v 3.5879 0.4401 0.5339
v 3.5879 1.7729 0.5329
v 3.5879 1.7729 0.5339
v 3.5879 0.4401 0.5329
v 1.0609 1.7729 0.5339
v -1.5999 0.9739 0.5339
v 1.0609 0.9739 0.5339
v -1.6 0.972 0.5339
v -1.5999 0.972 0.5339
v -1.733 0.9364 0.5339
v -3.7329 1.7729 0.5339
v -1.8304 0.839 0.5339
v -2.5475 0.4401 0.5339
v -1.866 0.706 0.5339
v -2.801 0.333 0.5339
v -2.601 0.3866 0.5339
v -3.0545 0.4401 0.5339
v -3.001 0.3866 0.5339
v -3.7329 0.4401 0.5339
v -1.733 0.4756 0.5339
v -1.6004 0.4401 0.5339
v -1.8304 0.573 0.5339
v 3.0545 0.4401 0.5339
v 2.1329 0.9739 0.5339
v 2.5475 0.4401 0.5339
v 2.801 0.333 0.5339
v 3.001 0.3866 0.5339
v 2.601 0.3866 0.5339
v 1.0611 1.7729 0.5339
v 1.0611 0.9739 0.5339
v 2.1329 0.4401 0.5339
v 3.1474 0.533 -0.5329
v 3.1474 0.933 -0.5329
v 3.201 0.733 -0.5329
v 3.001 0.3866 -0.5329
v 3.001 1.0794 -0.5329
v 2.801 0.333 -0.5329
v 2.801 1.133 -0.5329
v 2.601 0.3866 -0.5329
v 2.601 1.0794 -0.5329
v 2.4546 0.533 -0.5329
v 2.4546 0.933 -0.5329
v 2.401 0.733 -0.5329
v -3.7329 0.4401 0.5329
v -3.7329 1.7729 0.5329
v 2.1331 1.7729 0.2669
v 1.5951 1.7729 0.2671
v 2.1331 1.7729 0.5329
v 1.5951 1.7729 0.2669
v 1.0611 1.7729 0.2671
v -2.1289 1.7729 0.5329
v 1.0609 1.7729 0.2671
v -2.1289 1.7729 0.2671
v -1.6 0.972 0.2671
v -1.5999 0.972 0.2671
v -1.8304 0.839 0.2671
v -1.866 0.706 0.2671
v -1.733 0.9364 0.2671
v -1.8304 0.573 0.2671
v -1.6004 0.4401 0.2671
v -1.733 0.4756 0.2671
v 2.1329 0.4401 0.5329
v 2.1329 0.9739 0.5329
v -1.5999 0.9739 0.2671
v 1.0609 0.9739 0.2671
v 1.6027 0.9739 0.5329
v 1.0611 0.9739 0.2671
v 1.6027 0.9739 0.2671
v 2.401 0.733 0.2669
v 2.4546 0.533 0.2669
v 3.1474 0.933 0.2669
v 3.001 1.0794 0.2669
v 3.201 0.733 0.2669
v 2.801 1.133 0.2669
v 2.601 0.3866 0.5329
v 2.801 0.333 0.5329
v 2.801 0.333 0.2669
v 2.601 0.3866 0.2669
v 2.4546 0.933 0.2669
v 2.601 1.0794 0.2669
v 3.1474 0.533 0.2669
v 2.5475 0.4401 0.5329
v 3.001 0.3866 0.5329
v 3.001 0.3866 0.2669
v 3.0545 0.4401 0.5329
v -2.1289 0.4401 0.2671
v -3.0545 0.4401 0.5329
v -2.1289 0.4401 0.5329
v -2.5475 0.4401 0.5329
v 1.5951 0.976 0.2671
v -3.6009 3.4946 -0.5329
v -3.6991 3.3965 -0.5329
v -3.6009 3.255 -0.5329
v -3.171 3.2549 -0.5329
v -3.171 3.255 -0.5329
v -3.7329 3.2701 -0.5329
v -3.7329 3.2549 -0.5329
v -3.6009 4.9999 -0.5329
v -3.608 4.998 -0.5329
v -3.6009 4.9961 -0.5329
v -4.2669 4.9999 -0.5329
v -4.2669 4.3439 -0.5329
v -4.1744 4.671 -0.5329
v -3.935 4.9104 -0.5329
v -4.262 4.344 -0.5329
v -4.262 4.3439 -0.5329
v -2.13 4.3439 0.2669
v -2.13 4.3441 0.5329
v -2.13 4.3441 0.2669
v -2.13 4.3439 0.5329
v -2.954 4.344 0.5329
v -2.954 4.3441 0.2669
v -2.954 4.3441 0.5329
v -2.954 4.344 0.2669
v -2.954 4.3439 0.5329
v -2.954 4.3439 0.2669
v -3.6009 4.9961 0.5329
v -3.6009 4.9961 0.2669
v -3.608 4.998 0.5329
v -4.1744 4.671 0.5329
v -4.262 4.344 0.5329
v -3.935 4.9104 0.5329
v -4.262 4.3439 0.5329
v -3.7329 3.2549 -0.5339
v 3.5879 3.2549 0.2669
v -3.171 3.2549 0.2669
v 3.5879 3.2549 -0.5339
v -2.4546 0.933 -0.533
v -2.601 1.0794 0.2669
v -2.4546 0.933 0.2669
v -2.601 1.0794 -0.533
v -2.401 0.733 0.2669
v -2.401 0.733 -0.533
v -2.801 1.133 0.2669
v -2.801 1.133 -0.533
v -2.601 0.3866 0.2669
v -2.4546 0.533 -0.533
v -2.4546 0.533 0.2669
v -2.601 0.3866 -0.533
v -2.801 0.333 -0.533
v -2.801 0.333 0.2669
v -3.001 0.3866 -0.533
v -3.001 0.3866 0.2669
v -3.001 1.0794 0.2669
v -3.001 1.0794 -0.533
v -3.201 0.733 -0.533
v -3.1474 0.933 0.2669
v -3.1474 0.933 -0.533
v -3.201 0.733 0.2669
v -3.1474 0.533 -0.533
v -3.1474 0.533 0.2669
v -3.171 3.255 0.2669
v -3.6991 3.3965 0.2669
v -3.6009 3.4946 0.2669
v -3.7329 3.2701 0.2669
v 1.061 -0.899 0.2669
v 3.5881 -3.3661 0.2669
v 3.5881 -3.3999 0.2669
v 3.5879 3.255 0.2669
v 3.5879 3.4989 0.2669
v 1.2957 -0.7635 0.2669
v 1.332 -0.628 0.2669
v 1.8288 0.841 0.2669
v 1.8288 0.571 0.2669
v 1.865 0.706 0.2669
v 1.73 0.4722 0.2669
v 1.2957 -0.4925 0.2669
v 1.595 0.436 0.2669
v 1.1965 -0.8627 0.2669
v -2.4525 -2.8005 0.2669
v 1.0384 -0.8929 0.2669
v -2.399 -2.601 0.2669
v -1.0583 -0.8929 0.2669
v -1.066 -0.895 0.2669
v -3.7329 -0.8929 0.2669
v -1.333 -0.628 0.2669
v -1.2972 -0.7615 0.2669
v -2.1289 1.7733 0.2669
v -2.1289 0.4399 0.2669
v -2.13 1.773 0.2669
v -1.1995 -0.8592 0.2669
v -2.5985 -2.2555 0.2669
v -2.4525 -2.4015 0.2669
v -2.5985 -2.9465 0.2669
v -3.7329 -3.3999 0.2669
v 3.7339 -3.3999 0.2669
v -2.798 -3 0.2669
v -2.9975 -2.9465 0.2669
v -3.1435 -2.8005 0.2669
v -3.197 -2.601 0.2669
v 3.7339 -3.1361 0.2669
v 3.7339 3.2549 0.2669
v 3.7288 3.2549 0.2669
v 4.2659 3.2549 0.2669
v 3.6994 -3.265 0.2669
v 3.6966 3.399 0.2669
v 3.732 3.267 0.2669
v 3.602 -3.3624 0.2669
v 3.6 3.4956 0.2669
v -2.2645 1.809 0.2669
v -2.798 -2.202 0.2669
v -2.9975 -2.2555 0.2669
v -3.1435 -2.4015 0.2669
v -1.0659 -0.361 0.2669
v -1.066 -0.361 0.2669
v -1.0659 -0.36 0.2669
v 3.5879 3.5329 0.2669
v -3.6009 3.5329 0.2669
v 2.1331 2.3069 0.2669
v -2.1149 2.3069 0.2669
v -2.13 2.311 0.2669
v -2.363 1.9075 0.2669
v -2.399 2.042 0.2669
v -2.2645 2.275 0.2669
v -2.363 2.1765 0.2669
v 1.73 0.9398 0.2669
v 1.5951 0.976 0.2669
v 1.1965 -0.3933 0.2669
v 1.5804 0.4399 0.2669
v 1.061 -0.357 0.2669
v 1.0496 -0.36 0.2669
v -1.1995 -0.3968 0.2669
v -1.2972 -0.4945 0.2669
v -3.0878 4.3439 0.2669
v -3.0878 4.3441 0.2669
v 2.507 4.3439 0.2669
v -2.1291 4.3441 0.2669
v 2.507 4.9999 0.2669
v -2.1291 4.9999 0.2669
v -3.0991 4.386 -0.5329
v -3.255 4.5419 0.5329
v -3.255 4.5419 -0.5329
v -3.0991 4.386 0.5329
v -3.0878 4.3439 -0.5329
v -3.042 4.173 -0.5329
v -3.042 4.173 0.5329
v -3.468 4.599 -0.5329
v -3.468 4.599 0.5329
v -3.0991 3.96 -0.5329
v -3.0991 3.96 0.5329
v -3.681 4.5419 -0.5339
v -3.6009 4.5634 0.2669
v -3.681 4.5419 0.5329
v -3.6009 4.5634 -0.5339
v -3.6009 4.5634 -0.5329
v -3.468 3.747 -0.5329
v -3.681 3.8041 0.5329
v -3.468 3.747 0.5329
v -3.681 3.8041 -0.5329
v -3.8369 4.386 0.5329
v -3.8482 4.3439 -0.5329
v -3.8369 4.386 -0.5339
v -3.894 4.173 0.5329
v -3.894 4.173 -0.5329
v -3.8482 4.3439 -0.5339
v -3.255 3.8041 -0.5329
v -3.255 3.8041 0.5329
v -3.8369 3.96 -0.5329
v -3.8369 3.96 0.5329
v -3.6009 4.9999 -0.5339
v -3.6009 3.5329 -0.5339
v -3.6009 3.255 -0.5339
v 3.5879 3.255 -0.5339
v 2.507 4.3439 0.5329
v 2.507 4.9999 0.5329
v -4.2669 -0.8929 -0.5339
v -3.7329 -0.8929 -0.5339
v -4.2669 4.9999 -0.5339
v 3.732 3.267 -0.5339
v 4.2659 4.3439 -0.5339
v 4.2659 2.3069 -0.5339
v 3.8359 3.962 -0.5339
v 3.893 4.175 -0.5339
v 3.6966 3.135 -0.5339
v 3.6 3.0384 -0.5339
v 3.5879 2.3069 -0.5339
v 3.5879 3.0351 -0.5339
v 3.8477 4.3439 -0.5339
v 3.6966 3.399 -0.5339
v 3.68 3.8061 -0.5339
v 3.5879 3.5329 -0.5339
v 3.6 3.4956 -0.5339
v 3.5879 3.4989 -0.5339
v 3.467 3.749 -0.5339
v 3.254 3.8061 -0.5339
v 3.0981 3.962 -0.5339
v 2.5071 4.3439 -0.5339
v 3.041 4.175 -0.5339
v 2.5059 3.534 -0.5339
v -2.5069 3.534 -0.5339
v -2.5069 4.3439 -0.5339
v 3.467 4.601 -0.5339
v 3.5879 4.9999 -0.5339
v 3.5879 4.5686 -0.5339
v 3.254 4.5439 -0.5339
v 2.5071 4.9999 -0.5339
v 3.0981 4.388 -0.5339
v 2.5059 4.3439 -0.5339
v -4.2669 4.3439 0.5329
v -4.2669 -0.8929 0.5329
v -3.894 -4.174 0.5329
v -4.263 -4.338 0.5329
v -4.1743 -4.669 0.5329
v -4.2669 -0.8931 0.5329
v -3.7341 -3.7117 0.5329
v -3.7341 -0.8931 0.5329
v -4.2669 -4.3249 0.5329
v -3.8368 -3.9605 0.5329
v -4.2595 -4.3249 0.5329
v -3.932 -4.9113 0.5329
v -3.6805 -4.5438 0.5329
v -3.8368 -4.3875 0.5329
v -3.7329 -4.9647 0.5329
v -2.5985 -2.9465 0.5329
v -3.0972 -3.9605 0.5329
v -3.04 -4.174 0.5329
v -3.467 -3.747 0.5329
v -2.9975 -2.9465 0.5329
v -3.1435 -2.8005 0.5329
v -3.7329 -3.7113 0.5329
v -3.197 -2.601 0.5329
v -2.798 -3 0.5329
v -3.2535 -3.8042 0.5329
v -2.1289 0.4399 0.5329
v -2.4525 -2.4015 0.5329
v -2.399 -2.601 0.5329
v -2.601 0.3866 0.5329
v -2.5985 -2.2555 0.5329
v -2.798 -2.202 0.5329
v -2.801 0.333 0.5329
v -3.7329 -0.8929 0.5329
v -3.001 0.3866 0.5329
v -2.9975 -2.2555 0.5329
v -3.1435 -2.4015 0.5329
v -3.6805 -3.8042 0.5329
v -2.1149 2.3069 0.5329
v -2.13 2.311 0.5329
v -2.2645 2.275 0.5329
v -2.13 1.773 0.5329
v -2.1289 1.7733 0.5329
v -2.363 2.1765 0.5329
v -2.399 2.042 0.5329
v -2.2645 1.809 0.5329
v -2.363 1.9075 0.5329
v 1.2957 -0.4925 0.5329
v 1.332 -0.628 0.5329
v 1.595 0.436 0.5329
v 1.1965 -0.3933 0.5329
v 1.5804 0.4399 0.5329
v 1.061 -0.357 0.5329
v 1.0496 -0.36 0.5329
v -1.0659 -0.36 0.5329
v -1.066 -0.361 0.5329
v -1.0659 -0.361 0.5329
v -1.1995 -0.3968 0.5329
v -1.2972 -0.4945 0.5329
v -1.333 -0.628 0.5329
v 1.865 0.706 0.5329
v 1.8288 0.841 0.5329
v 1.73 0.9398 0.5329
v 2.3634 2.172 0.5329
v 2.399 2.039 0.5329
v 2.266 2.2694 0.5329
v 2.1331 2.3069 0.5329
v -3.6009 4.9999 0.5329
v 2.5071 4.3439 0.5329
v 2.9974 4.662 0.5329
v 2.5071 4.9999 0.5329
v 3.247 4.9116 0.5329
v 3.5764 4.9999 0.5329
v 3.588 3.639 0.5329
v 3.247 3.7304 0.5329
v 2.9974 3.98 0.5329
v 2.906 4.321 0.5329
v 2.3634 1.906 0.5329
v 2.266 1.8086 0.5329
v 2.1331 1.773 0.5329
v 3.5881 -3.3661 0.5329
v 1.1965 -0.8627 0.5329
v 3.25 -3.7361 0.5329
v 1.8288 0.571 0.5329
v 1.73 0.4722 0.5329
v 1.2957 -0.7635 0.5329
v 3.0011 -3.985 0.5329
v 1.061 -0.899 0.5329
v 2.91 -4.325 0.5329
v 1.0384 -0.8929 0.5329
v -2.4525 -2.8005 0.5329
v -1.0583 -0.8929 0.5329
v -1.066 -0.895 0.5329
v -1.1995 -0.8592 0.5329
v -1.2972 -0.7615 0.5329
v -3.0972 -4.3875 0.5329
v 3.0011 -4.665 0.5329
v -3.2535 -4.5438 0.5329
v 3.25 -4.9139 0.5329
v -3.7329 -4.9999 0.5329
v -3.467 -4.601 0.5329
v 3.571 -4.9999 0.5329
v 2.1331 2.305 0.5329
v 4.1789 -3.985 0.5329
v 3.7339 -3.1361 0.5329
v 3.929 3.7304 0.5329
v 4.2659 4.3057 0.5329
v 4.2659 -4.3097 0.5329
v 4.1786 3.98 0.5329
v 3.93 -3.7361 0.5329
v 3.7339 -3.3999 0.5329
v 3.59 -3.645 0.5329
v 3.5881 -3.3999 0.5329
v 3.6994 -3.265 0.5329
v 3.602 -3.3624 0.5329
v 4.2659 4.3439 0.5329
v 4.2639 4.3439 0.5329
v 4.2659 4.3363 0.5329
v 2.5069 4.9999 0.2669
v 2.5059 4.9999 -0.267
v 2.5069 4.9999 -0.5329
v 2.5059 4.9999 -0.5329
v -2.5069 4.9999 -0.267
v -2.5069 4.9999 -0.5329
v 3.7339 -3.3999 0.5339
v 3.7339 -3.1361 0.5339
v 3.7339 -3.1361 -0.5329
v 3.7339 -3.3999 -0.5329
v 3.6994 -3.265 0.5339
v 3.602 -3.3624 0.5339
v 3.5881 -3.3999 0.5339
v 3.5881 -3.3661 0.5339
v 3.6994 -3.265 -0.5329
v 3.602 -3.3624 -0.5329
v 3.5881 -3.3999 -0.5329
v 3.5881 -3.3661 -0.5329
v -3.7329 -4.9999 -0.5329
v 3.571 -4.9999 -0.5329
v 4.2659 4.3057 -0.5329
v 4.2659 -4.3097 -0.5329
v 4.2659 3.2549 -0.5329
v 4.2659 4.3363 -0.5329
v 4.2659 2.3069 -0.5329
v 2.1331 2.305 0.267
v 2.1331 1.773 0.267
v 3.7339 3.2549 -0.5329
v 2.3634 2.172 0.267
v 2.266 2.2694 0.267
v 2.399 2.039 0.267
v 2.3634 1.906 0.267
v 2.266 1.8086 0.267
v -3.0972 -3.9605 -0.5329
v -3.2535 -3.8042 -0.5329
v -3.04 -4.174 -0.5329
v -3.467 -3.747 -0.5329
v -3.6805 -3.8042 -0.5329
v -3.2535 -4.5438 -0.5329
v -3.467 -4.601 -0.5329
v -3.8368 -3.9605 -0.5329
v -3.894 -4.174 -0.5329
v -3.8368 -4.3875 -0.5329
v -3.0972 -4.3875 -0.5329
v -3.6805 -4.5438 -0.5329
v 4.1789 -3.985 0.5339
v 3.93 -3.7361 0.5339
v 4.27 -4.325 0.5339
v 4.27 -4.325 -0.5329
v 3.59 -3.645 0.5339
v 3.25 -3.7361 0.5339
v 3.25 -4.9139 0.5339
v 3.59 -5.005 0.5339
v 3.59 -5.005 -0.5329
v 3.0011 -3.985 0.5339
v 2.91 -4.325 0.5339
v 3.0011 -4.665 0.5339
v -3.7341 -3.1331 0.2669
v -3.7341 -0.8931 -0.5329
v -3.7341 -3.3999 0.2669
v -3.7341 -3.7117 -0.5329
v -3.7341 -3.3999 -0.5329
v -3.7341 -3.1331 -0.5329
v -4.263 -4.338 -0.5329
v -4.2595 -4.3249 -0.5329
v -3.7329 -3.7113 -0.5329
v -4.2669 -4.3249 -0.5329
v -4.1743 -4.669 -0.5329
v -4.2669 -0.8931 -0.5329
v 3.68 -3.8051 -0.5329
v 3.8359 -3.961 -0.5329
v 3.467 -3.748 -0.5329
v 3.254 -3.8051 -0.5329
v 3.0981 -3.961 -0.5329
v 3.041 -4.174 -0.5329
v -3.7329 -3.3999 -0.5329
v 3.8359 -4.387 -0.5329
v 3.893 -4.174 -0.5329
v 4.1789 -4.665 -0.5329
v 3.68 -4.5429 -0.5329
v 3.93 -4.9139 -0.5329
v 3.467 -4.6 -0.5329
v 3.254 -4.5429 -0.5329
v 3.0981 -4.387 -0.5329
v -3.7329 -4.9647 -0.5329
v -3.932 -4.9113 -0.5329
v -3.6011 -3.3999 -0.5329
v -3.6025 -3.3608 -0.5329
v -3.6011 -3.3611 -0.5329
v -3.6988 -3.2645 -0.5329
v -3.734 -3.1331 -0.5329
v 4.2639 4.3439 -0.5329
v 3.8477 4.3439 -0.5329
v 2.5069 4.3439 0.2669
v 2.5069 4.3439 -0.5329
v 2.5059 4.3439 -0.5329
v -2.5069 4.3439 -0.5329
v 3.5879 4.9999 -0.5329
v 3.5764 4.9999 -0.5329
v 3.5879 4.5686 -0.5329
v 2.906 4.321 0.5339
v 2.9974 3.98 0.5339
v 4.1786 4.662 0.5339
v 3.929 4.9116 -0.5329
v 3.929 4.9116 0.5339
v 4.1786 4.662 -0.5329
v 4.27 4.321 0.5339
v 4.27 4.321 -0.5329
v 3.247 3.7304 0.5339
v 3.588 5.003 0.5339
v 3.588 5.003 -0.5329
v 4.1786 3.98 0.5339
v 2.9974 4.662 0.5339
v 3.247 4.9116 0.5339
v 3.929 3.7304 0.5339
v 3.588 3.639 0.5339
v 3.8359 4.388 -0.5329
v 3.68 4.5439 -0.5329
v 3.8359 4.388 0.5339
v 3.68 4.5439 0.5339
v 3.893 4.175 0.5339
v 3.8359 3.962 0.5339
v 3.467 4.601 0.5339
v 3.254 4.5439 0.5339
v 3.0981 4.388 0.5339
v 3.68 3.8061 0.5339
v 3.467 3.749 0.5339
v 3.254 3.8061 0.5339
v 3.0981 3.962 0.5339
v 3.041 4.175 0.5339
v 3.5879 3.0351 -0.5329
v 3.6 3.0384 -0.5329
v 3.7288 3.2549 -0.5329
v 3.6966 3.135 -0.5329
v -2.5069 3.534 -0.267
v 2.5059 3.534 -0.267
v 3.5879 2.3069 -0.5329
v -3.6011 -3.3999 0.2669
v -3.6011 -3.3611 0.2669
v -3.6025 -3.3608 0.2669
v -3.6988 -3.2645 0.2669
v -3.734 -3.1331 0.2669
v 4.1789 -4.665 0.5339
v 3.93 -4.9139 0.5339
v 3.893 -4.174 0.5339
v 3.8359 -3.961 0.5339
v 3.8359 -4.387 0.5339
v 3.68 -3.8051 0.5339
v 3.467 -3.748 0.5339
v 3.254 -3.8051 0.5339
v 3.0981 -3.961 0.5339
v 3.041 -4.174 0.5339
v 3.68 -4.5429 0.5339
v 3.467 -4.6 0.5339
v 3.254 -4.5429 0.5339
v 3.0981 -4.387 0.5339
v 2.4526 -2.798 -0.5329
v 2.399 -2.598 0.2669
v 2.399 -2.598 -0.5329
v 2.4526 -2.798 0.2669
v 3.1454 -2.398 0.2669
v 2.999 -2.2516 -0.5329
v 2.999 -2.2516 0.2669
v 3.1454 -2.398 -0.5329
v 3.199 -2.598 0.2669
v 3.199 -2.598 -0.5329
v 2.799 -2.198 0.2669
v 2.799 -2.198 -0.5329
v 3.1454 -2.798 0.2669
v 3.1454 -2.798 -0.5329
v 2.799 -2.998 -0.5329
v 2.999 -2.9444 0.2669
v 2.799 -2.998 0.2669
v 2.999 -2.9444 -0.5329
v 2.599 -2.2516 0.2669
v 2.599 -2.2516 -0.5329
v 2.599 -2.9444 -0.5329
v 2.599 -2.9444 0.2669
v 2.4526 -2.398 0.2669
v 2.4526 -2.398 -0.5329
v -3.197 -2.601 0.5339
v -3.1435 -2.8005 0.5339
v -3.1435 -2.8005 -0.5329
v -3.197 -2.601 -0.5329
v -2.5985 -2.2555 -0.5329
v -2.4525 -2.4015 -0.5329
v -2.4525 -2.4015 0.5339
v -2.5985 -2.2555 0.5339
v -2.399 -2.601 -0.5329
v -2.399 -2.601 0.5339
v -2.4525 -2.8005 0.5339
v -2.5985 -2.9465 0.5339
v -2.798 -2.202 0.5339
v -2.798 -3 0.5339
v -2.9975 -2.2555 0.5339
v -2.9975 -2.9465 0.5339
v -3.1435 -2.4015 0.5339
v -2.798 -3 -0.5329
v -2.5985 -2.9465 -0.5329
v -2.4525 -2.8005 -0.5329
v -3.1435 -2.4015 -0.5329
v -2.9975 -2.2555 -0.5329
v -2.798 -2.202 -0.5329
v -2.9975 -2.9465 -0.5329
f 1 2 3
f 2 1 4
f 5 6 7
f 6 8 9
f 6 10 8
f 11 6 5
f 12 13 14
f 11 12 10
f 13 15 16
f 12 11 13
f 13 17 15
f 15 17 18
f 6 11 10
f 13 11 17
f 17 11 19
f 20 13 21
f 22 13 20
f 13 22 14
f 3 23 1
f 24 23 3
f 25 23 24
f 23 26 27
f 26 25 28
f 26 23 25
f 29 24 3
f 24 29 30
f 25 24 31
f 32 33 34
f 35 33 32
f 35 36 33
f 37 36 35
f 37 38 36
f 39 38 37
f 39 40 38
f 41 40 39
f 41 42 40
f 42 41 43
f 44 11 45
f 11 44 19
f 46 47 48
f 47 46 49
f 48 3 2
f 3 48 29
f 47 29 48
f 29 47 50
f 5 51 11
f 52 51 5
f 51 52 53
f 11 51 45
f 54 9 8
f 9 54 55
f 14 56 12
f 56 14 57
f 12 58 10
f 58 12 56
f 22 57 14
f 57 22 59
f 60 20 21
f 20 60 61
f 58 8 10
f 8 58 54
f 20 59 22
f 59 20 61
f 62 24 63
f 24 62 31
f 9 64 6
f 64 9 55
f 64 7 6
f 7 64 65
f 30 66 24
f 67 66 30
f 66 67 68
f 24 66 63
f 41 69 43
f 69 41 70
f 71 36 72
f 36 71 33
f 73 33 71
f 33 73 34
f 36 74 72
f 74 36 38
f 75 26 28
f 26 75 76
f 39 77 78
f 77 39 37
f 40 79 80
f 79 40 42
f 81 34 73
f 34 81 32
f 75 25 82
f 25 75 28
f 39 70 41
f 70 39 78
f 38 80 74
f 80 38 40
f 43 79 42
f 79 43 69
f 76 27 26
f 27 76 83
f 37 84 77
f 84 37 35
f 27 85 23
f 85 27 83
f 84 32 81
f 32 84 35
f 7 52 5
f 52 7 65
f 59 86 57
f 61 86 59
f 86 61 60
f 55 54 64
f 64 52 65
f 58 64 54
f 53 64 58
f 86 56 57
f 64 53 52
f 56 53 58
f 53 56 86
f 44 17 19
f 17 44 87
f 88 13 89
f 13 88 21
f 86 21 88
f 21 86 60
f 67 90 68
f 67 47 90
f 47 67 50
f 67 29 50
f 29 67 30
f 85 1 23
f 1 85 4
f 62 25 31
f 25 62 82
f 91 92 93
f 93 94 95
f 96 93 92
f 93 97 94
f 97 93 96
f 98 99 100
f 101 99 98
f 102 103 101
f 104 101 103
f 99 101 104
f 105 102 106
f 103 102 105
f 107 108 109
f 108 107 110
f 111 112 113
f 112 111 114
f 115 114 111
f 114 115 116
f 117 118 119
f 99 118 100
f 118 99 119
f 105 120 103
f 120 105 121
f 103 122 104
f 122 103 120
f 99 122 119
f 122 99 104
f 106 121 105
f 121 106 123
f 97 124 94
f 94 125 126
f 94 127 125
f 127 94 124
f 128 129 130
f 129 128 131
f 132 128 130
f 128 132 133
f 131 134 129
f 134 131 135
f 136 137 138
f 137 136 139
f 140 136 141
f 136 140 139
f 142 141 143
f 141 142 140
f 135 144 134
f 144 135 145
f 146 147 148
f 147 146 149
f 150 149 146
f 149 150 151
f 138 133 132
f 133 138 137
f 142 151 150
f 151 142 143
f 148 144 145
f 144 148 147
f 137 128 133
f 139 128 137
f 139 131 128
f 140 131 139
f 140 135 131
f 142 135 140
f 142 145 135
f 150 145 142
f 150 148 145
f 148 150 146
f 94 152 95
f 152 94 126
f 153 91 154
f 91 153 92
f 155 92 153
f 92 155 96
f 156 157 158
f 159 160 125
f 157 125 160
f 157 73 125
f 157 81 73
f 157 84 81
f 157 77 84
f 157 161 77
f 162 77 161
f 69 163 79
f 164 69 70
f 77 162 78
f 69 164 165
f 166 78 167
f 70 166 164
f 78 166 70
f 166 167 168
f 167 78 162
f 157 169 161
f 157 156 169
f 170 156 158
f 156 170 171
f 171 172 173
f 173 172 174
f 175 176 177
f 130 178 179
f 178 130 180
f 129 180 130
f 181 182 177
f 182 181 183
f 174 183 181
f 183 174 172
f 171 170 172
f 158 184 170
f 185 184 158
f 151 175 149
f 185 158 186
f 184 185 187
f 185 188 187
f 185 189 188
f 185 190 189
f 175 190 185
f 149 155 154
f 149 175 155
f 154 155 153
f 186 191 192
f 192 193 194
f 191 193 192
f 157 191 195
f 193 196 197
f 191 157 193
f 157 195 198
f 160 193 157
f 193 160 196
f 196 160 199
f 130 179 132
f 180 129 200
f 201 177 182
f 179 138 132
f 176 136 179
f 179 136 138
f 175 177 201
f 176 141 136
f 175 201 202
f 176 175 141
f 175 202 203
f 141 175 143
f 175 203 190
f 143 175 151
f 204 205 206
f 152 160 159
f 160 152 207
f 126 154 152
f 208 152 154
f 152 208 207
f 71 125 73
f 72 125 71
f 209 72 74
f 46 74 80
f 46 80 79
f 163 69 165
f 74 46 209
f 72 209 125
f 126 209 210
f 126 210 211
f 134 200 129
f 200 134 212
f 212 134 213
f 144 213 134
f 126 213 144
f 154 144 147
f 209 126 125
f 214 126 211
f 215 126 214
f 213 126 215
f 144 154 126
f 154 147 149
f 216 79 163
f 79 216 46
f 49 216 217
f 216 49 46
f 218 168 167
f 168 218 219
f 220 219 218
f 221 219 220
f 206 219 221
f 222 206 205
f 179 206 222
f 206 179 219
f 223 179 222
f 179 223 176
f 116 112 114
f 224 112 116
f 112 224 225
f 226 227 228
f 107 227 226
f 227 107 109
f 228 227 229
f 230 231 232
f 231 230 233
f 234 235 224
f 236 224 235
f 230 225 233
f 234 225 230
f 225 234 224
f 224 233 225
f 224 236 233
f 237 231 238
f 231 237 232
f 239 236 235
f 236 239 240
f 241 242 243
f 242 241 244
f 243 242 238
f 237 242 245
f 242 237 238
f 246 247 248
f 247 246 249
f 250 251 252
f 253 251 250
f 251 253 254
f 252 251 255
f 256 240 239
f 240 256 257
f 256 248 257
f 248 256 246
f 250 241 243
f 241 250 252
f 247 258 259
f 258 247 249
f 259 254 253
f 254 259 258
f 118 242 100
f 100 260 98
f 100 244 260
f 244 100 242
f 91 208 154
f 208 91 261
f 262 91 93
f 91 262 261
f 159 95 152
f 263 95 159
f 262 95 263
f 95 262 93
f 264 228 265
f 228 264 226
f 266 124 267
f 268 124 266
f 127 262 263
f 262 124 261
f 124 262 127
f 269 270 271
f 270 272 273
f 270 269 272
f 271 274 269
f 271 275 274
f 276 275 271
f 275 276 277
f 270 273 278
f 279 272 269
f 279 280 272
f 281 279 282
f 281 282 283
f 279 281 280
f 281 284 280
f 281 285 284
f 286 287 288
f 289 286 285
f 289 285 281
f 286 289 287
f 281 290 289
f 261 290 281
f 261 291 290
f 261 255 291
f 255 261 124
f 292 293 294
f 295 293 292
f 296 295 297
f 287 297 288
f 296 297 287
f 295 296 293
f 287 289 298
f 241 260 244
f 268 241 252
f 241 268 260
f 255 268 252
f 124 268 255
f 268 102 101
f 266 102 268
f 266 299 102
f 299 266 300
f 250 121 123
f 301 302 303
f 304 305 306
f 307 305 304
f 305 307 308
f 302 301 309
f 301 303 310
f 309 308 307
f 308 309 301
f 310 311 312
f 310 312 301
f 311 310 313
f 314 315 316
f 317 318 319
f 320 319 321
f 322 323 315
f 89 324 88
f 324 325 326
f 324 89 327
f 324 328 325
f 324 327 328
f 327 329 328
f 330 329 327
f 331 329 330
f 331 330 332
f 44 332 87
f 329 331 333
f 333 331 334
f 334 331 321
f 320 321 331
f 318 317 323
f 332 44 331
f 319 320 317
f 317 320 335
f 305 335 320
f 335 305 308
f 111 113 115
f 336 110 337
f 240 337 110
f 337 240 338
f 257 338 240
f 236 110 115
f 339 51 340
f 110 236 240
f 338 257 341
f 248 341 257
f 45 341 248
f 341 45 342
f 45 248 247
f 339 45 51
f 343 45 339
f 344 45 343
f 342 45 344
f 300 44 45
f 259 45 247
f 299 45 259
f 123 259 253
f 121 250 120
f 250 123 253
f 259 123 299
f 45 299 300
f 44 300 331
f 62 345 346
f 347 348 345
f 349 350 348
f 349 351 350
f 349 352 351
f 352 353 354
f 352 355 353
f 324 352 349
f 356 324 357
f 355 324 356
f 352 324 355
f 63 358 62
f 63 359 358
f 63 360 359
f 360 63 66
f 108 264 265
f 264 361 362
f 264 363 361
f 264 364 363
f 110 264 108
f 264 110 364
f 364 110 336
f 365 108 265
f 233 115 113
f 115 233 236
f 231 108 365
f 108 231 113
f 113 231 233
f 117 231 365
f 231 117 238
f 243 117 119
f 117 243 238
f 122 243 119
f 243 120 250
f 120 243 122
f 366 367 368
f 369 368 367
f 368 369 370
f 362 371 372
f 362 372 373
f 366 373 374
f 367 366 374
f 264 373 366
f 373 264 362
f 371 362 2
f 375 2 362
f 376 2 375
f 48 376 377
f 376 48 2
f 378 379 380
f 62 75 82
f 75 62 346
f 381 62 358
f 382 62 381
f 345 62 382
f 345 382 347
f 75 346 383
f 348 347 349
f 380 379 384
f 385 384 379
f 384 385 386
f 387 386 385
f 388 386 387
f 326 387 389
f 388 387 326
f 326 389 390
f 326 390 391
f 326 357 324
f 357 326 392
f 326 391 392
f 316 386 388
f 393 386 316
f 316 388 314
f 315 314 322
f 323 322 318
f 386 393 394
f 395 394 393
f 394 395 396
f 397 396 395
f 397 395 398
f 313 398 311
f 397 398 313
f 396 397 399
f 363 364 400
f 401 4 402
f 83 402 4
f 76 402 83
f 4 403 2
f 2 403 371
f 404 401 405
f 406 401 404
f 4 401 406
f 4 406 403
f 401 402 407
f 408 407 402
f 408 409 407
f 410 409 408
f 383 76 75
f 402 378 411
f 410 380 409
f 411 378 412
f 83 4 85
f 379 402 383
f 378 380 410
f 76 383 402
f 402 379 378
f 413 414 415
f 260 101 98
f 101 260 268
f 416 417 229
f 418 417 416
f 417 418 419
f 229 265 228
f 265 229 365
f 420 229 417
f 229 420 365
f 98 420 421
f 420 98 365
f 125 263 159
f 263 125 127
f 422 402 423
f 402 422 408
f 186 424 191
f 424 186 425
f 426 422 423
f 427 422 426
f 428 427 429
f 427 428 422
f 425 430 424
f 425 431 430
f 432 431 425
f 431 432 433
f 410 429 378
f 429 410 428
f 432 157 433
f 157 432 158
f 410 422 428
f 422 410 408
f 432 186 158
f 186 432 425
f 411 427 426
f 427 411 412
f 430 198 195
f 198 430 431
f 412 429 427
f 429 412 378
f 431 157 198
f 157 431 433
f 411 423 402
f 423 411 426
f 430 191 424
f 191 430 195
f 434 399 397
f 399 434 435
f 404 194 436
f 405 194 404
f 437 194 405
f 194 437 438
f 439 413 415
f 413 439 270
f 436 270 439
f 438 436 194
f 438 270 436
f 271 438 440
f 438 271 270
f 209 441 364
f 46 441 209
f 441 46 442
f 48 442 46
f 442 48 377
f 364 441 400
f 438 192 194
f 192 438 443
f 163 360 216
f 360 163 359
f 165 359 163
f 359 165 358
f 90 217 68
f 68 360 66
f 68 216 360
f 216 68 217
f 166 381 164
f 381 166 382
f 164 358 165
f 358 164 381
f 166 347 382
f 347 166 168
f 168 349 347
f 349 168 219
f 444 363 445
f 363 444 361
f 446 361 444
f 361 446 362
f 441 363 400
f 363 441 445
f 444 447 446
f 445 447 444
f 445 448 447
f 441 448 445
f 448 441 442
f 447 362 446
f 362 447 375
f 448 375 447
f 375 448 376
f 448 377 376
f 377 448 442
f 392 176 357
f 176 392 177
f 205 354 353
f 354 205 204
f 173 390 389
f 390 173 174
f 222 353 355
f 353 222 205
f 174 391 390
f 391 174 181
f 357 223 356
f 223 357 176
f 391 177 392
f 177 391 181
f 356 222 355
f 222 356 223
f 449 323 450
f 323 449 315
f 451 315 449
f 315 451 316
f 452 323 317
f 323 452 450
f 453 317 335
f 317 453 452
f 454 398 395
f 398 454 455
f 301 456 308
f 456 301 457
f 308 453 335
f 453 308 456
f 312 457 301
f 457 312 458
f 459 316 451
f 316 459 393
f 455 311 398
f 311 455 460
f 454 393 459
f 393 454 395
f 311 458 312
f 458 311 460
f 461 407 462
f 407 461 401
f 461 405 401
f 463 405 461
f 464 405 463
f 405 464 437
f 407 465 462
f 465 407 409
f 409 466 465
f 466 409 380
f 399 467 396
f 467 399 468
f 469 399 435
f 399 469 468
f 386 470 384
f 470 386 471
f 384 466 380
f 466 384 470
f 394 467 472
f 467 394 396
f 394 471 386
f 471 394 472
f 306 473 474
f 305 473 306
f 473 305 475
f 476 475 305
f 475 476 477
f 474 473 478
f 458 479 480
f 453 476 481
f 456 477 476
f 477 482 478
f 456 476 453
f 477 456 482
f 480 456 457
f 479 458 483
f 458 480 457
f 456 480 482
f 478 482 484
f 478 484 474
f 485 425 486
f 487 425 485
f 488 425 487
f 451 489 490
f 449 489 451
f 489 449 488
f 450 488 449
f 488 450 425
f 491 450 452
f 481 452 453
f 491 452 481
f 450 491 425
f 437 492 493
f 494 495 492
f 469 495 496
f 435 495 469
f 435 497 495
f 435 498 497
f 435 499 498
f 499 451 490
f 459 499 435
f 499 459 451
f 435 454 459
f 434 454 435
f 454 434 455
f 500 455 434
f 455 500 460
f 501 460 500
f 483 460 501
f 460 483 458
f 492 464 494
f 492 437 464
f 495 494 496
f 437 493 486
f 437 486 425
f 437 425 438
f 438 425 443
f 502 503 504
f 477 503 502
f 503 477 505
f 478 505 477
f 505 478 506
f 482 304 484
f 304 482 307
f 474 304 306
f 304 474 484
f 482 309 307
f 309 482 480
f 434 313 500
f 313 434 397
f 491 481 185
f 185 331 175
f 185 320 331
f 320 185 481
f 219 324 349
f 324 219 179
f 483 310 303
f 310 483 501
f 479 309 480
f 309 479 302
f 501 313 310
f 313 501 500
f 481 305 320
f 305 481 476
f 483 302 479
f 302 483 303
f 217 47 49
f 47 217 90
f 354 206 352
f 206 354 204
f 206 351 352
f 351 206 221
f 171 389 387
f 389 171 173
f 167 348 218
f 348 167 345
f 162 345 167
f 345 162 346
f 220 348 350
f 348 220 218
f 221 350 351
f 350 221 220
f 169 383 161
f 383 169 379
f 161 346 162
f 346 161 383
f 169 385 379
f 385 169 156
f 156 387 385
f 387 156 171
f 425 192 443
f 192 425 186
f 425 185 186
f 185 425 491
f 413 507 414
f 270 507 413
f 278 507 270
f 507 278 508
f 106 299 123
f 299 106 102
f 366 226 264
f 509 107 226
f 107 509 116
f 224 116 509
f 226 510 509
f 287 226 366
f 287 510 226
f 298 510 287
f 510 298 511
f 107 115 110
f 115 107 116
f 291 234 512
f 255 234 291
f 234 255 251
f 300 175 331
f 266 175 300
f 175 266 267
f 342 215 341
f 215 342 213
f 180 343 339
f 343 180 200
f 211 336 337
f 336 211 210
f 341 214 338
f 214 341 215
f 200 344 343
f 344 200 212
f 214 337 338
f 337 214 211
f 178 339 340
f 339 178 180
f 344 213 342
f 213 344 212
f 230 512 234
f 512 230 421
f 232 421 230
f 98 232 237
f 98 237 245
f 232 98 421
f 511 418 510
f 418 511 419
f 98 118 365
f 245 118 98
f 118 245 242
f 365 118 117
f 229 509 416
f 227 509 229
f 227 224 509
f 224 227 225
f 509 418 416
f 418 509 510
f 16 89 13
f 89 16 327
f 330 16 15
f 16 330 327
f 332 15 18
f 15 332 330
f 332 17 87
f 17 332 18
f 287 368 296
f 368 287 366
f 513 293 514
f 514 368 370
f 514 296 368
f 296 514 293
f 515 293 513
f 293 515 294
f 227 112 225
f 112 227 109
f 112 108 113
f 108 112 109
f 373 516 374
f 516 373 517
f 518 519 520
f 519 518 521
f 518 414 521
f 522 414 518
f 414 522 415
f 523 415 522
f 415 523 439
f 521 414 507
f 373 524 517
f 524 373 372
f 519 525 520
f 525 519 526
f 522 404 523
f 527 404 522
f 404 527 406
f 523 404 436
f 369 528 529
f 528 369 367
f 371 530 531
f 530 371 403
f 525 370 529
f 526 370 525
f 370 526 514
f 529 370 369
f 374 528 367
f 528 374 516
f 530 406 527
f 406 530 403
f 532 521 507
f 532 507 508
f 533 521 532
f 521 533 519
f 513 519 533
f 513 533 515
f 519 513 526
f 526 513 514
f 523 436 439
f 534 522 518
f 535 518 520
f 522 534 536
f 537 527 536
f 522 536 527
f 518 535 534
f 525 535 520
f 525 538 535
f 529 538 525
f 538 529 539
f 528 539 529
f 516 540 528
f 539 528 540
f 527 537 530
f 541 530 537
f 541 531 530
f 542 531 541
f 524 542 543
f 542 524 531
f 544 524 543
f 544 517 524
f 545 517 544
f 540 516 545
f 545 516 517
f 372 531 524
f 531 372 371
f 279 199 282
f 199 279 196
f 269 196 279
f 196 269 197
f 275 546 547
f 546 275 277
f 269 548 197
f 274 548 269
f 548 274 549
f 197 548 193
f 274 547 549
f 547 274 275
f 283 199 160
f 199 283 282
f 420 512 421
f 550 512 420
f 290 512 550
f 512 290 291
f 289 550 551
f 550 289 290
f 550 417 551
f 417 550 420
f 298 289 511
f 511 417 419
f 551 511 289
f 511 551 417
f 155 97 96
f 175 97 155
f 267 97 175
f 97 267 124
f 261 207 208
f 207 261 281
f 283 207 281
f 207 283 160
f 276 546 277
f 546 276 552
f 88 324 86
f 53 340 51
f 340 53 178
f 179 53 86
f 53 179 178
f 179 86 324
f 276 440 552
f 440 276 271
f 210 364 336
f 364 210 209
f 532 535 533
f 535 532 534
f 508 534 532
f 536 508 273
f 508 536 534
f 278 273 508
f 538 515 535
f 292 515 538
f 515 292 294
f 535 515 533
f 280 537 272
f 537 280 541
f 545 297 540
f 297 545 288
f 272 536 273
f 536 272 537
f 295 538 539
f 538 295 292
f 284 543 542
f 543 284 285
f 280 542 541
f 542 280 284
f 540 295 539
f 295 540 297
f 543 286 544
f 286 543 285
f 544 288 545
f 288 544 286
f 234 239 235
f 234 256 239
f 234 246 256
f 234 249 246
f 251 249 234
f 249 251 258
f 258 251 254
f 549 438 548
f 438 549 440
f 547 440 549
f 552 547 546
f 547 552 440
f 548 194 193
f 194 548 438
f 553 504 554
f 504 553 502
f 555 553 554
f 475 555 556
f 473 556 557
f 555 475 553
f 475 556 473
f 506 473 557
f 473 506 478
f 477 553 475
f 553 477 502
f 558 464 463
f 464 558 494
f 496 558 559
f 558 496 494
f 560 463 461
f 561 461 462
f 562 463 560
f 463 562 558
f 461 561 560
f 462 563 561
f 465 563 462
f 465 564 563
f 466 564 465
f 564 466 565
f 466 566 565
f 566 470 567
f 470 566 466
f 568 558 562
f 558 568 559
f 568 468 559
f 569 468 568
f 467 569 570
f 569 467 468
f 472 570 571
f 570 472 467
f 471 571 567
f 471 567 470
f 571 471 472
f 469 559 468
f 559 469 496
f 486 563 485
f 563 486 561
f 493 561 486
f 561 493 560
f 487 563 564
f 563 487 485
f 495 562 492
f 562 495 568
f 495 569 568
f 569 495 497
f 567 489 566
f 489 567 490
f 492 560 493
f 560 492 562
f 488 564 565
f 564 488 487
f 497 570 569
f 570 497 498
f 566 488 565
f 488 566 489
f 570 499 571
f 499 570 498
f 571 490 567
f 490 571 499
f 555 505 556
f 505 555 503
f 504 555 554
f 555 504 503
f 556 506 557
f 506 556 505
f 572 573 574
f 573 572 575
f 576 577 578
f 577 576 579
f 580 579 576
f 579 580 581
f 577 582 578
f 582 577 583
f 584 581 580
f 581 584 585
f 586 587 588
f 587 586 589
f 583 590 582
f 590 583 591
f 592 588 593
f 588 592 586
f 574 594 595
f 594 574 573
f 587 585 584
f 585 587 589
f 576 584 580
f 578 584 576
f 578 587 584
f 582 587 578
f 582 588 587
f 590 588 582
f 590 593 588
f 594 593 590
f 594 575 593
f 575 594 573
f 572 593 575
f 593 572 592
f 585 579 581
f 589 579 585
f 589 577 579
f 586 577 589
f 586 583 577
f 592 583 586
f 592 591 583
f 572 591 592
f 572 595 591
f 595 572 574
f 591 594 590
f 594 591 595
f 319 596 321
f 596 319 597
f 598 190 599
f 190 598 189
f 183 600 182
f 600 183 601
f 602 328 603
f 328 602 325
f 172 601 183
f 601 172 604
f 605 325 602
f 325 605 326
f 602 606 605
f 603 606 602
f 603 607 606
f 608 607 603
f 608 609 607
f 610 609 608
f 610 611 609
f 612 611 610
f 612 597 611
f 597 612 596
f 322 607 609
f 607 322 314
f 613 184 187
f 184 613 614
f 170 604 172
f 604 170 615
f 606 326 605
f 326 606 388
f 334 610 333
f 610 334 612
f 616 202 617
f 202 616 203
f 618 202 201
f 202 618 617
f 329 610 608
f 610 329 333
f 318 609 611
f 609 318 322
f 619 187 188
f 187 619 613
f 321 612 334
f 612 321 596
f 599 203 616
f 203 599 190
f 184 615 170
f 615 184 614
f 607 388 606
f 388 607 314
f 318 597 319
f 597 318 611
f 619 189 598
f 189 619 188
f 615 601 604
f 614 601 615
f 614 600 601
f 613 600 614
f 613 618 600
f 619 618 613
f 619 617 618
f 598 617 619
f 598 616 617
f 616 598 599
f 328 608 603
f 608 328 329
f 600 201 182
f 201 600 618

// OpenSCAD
intersection() {
  cube(size = [10.2398, 11.9998, 1.2798], center = true);

  union() {
    intersection() {
      difference() {
        difference() {
          translate([-0.0725, -0.8135, 0.0005])
          cube(size = [7.3208, 5.1728, 1.0668], center = true);
        
          translate([-1.6, 0.706, 0.0005])
          cylinder(h = 1.0669, r1 = 0.266, r2 = 0.266, center = true, $fn = 12);
        }
      
        union() {
          translate([2.133, 2.039, 0])
          cylinder(h = 36.1999, r1 = 0.266, r2 = 0.266, center = true, $fn = 12);
        
          translate([0.2665, 0.0405, 0.0005])
          cube(size = [3.7329, 1.8669, 1.0669], center = true);
        }
      }
    
      union() {
        translate([2.801, 0.733, 0])
        cylinder(h = 36.1998, r1 = 0.4, r2 = 0.4, center = true, $fn = 12);
      
        translate([-1.336, 1.1065, 9.1835])
        cube(size = [4.7938, 1.3328, 17.8328], center = true);
      
        translate([2.3245, 1.1065, 0.4005])
        cube(size = [2.5268, 1.3328, 0.2668], center = true);
      
        translate([2.8605, 10.6775, 0.0005])
        cube(size = [1.4548, 14.8448, 1.0668], center = true);
      }
    }
  
    translate([2.799, -2.598, -0.133])
    cylinder(h = 0.7998, r1 = 0.4, r2 = 0.4, center = true, $fn = 12);
  
    difference() {
      translate([-0.3395, 2.0535, -0.0005])
      rotate([-180, 0, 0])
      cube(size = [7.8548, 5.8928, 1.0668], center = true);
    
      union() {
        translate([-3.454, 3.255, -0.133])
        cylinder(h = 0.7999, r1 = 0.283, r2 = 0.283, center = true, $fn = 12);
      
        difference() {
          translate([-10.115, 4.267, 8.7835])
          rotate([-180, 0, 0])
          cube(size = [15.9699, 1.4659, 18.6329], center = true);
        
          translate([-3.608, 4.344, 0])
          cylinder(h = 36.2, r1 = 0.654, r2 = 0.654, center = true, $fn = 12);
        }
      
        translate([-3.468, 4.173, 0])
        cylinder(h = 36.1999, r1 = 0.426, r2 = 0.426, center = true, $fn = 12);
      
        difference() {
          translate([0, 1.1805, -0.0005])
          rotate([-180, 0, 0])
          cube(size = [36.1999, 4.1489, 1.0669], center = true);
        
          translate([-2.801, 0.733, 8.7835])
          cylinder(h = 18.633, r1 = 0.4, r2 = 0.4, center = true, $fn = 12);
        }
      
        translate([-0.0065, 10.6775, -8.9165])
        rotate([-180, 0, 0])
        cube(size = [7.1889, 14.8449, 18.3669], center = true);
      
        translate([10.3035, 10.8165, -8.7835])
        rotate([-180, 0, 0])
        cube(size = [15.5929, 14.5669, 18.6329], center = true);
      }
    }
  
    translate([-2.798, -2.601, 0.0005])
    cylinder(h = 1.0668, r1 = 0.399, r2 = 0.399, center = true, $fn = 12);
  
    difference() {
      translate([3.661, -3.2665, 0.0005])
      cube(size = [0.1458, 0.2668, 1.0668], center = true);
    
      translate([3.469, -3.132, 0])
      cylinder(h = 36.1999, r1 = 0.266, r2 = 0.266, center = true, $fn = 12);
    }
  
    intersection() {
      difference() {
        difference() {
          union() {
            translate([-7.256, -1.6135, -8.7835])
            cube(size = [21.6878, 6.7728, 18.6328], center = true);
          
            translate([3.1995, -0.8725, -8.7835])
            cube(size = [2.1328, 8.2548, 18.6328], center = true);
          }
        
          translate([1.595, 0.706, 0])
          cylinder(h = 36.1999, r1 = 0.27, r2 = 0.27, center = true, $fn = 12);
        }
      
        union() {
          translate([2.133, 2.039, 9.1835])
          cylinder(h = 17.8329, r1 = 0.266, r2 = 0.266, center = true, $fn = 12);
        
          translate([-1.066, -0.628, 8.7835])
          cylinder(h = 18.6329, r1 = 0.267, r2 = 0.267, center = true, $fn = 12);
        
          translate([-3.467, -4.174, 0])
          cylinder(h = 36.1999, r1 = 0.427, r2 = 0.427, center = true, $fn = 12);
        
          translate([3.59, -4.325, -8.7835])
          cylinder(h = 18.6329, r1 = 0.68, r2 = 0.68, center = true, $fn = 12);
        }
      }
    
      difference() {
        union() {
          translate([-4.0005, -2.609, 0.0005])
          cube(size = [0.5328, 3.4318, 1.0668], center = true);
        
          translate([-0.0725, -2.28, 0.0005])
          cube(size = [7.3208, 5.4398, 1.0668], center = true);
        
          translate([-3.601, -4.338, 8.7835])
          cylinder(h = 18.6328, r1 = 0.662, r2 = 0.662, center = true, $fn = 12);
        
          translate([2.931, -0.5345, 0.0005])
          cube(size = [2.6718, 7.5808, 1.0668], center = true);
        }
      
        union() {
          translate([-0.0025, -0.6265, -8.7835])
          cube(size = [2.1269, 0.5329, 18.6329], center = true);
        
          translate([1.061, -0.628, 0])
          cylinder(h = 36.1999, r1 = 0.271, r2 = 0.271, center = true, $fn = 12);
        
          translate([0.0005, -0.0725, -0.133])
          cube(size = [7.4669, 6.6549, 0.7999], center = true);
        }
      }
    }
  
    difference() {
      union() {
        translate([-0.547, 2.0535, -0.133])
        rotate([-180, 0, 0])
        cube(size = [6.1078, 5.8928, 0.7998], center = true);
      
        translate([-2.801, 0.733, 0.4005])
        cylinder(h = 0.2668, r1 = 0.4, r2 = 0.4, center = true, $fn = 12);
      
        difference() {
          translate([-0.0005, 1.7255, -0.0005])
          rotate([-180, 0, 0])
          cube(size = [8.5328, 5.2368, 1.0668], center = true);
        
          translate([-2.13, 2.042, 0])
          cylinder(h = 36.1999, r1 = 0.269, r2 = 0.269, center = true, $fn = 12);
        }
      
        translate([3.0475, 2.0535, -0.0005])
        rotate([-180, 0, 0])
        cube(size = [1.0808, 5.8928, 1.0668], center = true);
      
        translate([-2.865, 4.672, 0.3995])
        rotate([-180, 0, 0])
        cube(size = [1.4718, 0.6558, 0.2668], center = true);
      
        translate([3.588, 4.321, 0.0005])
        cylinder(h = 1.0668, r1 = 0.682, r2 = 0.682, center = true, $fn = 12);
      }
    
      union() {
        translate([-0.0005, 4.267, -9.1835])
        rotate([-180, 0, 0])
        cube(size = [5.0129, 1.4659, 17.8329], center = true);
      
        translate([-0.0725, 1.3195, -8.9165])
        rotate([-180, 0, 0])
        cube(size = [7.3209, 4.4269, 18.3669], center = true);
      
        translate([7.9855, -7.8965, 0])
        rotate([-180, 0, 0])
        cube(size = [20.2289, 20.4069, 36.1999], center = true);
      
        difference() {
          translate([3.468, 3.267, -8.9165])
          cylinder(h = 18.3669, r1 = 0.264, r2 = 0.264, center = true, $fn = 12);
        
          translate([3.588, 4.321, 8.9165])
          cylinder(h = 18.367, r1 = 0.682, r2 = 0.682, center = true, $fn = 12);
        }
      
        translate([3.467, 4.175, 0])
        cylinder(h = 36.1999, r1 = 0.426, r2 = 0.426, center = true, $fn = 12);
      
        translate([-3.468, 4.173, 8.7835])
        cylinder(h = 18.6329, r1 = 0.426, r2 = 0.426, center = true, $fn = 12);
      
        translate([0.8795, 2.7805, -0.133])
        rotate([-180, 0, 0])
        cube(size = [6.7729, 0.9489, 0.7999], center = true);
      }
    }
  
    difference() {
      union() {
        translate([-3.934, -3.2665, -0.133])
        cube(size = [0.6658, 0.2668, 0.7998], center = true);
      
        translate([3.59, -4.325, 0.0005])
        cylinder(h = 1.0668, r1 = 0.68, r2 = 0.68, center = true, $fn = 12);
      }
    
      union() {
        translate([3.467, -4.174, 0])
        cylinder(h = 36.1999, r1 = 0.426, r2 = 0.426, center = true, $fn = 12);
      
        translate([-3.471, -3.133, 8.7835])
        cylinder(h = 18.6329, r1 = 0.263, r2 = 0.263, center = true, $fn = 12);
      }
    }
  }
}
